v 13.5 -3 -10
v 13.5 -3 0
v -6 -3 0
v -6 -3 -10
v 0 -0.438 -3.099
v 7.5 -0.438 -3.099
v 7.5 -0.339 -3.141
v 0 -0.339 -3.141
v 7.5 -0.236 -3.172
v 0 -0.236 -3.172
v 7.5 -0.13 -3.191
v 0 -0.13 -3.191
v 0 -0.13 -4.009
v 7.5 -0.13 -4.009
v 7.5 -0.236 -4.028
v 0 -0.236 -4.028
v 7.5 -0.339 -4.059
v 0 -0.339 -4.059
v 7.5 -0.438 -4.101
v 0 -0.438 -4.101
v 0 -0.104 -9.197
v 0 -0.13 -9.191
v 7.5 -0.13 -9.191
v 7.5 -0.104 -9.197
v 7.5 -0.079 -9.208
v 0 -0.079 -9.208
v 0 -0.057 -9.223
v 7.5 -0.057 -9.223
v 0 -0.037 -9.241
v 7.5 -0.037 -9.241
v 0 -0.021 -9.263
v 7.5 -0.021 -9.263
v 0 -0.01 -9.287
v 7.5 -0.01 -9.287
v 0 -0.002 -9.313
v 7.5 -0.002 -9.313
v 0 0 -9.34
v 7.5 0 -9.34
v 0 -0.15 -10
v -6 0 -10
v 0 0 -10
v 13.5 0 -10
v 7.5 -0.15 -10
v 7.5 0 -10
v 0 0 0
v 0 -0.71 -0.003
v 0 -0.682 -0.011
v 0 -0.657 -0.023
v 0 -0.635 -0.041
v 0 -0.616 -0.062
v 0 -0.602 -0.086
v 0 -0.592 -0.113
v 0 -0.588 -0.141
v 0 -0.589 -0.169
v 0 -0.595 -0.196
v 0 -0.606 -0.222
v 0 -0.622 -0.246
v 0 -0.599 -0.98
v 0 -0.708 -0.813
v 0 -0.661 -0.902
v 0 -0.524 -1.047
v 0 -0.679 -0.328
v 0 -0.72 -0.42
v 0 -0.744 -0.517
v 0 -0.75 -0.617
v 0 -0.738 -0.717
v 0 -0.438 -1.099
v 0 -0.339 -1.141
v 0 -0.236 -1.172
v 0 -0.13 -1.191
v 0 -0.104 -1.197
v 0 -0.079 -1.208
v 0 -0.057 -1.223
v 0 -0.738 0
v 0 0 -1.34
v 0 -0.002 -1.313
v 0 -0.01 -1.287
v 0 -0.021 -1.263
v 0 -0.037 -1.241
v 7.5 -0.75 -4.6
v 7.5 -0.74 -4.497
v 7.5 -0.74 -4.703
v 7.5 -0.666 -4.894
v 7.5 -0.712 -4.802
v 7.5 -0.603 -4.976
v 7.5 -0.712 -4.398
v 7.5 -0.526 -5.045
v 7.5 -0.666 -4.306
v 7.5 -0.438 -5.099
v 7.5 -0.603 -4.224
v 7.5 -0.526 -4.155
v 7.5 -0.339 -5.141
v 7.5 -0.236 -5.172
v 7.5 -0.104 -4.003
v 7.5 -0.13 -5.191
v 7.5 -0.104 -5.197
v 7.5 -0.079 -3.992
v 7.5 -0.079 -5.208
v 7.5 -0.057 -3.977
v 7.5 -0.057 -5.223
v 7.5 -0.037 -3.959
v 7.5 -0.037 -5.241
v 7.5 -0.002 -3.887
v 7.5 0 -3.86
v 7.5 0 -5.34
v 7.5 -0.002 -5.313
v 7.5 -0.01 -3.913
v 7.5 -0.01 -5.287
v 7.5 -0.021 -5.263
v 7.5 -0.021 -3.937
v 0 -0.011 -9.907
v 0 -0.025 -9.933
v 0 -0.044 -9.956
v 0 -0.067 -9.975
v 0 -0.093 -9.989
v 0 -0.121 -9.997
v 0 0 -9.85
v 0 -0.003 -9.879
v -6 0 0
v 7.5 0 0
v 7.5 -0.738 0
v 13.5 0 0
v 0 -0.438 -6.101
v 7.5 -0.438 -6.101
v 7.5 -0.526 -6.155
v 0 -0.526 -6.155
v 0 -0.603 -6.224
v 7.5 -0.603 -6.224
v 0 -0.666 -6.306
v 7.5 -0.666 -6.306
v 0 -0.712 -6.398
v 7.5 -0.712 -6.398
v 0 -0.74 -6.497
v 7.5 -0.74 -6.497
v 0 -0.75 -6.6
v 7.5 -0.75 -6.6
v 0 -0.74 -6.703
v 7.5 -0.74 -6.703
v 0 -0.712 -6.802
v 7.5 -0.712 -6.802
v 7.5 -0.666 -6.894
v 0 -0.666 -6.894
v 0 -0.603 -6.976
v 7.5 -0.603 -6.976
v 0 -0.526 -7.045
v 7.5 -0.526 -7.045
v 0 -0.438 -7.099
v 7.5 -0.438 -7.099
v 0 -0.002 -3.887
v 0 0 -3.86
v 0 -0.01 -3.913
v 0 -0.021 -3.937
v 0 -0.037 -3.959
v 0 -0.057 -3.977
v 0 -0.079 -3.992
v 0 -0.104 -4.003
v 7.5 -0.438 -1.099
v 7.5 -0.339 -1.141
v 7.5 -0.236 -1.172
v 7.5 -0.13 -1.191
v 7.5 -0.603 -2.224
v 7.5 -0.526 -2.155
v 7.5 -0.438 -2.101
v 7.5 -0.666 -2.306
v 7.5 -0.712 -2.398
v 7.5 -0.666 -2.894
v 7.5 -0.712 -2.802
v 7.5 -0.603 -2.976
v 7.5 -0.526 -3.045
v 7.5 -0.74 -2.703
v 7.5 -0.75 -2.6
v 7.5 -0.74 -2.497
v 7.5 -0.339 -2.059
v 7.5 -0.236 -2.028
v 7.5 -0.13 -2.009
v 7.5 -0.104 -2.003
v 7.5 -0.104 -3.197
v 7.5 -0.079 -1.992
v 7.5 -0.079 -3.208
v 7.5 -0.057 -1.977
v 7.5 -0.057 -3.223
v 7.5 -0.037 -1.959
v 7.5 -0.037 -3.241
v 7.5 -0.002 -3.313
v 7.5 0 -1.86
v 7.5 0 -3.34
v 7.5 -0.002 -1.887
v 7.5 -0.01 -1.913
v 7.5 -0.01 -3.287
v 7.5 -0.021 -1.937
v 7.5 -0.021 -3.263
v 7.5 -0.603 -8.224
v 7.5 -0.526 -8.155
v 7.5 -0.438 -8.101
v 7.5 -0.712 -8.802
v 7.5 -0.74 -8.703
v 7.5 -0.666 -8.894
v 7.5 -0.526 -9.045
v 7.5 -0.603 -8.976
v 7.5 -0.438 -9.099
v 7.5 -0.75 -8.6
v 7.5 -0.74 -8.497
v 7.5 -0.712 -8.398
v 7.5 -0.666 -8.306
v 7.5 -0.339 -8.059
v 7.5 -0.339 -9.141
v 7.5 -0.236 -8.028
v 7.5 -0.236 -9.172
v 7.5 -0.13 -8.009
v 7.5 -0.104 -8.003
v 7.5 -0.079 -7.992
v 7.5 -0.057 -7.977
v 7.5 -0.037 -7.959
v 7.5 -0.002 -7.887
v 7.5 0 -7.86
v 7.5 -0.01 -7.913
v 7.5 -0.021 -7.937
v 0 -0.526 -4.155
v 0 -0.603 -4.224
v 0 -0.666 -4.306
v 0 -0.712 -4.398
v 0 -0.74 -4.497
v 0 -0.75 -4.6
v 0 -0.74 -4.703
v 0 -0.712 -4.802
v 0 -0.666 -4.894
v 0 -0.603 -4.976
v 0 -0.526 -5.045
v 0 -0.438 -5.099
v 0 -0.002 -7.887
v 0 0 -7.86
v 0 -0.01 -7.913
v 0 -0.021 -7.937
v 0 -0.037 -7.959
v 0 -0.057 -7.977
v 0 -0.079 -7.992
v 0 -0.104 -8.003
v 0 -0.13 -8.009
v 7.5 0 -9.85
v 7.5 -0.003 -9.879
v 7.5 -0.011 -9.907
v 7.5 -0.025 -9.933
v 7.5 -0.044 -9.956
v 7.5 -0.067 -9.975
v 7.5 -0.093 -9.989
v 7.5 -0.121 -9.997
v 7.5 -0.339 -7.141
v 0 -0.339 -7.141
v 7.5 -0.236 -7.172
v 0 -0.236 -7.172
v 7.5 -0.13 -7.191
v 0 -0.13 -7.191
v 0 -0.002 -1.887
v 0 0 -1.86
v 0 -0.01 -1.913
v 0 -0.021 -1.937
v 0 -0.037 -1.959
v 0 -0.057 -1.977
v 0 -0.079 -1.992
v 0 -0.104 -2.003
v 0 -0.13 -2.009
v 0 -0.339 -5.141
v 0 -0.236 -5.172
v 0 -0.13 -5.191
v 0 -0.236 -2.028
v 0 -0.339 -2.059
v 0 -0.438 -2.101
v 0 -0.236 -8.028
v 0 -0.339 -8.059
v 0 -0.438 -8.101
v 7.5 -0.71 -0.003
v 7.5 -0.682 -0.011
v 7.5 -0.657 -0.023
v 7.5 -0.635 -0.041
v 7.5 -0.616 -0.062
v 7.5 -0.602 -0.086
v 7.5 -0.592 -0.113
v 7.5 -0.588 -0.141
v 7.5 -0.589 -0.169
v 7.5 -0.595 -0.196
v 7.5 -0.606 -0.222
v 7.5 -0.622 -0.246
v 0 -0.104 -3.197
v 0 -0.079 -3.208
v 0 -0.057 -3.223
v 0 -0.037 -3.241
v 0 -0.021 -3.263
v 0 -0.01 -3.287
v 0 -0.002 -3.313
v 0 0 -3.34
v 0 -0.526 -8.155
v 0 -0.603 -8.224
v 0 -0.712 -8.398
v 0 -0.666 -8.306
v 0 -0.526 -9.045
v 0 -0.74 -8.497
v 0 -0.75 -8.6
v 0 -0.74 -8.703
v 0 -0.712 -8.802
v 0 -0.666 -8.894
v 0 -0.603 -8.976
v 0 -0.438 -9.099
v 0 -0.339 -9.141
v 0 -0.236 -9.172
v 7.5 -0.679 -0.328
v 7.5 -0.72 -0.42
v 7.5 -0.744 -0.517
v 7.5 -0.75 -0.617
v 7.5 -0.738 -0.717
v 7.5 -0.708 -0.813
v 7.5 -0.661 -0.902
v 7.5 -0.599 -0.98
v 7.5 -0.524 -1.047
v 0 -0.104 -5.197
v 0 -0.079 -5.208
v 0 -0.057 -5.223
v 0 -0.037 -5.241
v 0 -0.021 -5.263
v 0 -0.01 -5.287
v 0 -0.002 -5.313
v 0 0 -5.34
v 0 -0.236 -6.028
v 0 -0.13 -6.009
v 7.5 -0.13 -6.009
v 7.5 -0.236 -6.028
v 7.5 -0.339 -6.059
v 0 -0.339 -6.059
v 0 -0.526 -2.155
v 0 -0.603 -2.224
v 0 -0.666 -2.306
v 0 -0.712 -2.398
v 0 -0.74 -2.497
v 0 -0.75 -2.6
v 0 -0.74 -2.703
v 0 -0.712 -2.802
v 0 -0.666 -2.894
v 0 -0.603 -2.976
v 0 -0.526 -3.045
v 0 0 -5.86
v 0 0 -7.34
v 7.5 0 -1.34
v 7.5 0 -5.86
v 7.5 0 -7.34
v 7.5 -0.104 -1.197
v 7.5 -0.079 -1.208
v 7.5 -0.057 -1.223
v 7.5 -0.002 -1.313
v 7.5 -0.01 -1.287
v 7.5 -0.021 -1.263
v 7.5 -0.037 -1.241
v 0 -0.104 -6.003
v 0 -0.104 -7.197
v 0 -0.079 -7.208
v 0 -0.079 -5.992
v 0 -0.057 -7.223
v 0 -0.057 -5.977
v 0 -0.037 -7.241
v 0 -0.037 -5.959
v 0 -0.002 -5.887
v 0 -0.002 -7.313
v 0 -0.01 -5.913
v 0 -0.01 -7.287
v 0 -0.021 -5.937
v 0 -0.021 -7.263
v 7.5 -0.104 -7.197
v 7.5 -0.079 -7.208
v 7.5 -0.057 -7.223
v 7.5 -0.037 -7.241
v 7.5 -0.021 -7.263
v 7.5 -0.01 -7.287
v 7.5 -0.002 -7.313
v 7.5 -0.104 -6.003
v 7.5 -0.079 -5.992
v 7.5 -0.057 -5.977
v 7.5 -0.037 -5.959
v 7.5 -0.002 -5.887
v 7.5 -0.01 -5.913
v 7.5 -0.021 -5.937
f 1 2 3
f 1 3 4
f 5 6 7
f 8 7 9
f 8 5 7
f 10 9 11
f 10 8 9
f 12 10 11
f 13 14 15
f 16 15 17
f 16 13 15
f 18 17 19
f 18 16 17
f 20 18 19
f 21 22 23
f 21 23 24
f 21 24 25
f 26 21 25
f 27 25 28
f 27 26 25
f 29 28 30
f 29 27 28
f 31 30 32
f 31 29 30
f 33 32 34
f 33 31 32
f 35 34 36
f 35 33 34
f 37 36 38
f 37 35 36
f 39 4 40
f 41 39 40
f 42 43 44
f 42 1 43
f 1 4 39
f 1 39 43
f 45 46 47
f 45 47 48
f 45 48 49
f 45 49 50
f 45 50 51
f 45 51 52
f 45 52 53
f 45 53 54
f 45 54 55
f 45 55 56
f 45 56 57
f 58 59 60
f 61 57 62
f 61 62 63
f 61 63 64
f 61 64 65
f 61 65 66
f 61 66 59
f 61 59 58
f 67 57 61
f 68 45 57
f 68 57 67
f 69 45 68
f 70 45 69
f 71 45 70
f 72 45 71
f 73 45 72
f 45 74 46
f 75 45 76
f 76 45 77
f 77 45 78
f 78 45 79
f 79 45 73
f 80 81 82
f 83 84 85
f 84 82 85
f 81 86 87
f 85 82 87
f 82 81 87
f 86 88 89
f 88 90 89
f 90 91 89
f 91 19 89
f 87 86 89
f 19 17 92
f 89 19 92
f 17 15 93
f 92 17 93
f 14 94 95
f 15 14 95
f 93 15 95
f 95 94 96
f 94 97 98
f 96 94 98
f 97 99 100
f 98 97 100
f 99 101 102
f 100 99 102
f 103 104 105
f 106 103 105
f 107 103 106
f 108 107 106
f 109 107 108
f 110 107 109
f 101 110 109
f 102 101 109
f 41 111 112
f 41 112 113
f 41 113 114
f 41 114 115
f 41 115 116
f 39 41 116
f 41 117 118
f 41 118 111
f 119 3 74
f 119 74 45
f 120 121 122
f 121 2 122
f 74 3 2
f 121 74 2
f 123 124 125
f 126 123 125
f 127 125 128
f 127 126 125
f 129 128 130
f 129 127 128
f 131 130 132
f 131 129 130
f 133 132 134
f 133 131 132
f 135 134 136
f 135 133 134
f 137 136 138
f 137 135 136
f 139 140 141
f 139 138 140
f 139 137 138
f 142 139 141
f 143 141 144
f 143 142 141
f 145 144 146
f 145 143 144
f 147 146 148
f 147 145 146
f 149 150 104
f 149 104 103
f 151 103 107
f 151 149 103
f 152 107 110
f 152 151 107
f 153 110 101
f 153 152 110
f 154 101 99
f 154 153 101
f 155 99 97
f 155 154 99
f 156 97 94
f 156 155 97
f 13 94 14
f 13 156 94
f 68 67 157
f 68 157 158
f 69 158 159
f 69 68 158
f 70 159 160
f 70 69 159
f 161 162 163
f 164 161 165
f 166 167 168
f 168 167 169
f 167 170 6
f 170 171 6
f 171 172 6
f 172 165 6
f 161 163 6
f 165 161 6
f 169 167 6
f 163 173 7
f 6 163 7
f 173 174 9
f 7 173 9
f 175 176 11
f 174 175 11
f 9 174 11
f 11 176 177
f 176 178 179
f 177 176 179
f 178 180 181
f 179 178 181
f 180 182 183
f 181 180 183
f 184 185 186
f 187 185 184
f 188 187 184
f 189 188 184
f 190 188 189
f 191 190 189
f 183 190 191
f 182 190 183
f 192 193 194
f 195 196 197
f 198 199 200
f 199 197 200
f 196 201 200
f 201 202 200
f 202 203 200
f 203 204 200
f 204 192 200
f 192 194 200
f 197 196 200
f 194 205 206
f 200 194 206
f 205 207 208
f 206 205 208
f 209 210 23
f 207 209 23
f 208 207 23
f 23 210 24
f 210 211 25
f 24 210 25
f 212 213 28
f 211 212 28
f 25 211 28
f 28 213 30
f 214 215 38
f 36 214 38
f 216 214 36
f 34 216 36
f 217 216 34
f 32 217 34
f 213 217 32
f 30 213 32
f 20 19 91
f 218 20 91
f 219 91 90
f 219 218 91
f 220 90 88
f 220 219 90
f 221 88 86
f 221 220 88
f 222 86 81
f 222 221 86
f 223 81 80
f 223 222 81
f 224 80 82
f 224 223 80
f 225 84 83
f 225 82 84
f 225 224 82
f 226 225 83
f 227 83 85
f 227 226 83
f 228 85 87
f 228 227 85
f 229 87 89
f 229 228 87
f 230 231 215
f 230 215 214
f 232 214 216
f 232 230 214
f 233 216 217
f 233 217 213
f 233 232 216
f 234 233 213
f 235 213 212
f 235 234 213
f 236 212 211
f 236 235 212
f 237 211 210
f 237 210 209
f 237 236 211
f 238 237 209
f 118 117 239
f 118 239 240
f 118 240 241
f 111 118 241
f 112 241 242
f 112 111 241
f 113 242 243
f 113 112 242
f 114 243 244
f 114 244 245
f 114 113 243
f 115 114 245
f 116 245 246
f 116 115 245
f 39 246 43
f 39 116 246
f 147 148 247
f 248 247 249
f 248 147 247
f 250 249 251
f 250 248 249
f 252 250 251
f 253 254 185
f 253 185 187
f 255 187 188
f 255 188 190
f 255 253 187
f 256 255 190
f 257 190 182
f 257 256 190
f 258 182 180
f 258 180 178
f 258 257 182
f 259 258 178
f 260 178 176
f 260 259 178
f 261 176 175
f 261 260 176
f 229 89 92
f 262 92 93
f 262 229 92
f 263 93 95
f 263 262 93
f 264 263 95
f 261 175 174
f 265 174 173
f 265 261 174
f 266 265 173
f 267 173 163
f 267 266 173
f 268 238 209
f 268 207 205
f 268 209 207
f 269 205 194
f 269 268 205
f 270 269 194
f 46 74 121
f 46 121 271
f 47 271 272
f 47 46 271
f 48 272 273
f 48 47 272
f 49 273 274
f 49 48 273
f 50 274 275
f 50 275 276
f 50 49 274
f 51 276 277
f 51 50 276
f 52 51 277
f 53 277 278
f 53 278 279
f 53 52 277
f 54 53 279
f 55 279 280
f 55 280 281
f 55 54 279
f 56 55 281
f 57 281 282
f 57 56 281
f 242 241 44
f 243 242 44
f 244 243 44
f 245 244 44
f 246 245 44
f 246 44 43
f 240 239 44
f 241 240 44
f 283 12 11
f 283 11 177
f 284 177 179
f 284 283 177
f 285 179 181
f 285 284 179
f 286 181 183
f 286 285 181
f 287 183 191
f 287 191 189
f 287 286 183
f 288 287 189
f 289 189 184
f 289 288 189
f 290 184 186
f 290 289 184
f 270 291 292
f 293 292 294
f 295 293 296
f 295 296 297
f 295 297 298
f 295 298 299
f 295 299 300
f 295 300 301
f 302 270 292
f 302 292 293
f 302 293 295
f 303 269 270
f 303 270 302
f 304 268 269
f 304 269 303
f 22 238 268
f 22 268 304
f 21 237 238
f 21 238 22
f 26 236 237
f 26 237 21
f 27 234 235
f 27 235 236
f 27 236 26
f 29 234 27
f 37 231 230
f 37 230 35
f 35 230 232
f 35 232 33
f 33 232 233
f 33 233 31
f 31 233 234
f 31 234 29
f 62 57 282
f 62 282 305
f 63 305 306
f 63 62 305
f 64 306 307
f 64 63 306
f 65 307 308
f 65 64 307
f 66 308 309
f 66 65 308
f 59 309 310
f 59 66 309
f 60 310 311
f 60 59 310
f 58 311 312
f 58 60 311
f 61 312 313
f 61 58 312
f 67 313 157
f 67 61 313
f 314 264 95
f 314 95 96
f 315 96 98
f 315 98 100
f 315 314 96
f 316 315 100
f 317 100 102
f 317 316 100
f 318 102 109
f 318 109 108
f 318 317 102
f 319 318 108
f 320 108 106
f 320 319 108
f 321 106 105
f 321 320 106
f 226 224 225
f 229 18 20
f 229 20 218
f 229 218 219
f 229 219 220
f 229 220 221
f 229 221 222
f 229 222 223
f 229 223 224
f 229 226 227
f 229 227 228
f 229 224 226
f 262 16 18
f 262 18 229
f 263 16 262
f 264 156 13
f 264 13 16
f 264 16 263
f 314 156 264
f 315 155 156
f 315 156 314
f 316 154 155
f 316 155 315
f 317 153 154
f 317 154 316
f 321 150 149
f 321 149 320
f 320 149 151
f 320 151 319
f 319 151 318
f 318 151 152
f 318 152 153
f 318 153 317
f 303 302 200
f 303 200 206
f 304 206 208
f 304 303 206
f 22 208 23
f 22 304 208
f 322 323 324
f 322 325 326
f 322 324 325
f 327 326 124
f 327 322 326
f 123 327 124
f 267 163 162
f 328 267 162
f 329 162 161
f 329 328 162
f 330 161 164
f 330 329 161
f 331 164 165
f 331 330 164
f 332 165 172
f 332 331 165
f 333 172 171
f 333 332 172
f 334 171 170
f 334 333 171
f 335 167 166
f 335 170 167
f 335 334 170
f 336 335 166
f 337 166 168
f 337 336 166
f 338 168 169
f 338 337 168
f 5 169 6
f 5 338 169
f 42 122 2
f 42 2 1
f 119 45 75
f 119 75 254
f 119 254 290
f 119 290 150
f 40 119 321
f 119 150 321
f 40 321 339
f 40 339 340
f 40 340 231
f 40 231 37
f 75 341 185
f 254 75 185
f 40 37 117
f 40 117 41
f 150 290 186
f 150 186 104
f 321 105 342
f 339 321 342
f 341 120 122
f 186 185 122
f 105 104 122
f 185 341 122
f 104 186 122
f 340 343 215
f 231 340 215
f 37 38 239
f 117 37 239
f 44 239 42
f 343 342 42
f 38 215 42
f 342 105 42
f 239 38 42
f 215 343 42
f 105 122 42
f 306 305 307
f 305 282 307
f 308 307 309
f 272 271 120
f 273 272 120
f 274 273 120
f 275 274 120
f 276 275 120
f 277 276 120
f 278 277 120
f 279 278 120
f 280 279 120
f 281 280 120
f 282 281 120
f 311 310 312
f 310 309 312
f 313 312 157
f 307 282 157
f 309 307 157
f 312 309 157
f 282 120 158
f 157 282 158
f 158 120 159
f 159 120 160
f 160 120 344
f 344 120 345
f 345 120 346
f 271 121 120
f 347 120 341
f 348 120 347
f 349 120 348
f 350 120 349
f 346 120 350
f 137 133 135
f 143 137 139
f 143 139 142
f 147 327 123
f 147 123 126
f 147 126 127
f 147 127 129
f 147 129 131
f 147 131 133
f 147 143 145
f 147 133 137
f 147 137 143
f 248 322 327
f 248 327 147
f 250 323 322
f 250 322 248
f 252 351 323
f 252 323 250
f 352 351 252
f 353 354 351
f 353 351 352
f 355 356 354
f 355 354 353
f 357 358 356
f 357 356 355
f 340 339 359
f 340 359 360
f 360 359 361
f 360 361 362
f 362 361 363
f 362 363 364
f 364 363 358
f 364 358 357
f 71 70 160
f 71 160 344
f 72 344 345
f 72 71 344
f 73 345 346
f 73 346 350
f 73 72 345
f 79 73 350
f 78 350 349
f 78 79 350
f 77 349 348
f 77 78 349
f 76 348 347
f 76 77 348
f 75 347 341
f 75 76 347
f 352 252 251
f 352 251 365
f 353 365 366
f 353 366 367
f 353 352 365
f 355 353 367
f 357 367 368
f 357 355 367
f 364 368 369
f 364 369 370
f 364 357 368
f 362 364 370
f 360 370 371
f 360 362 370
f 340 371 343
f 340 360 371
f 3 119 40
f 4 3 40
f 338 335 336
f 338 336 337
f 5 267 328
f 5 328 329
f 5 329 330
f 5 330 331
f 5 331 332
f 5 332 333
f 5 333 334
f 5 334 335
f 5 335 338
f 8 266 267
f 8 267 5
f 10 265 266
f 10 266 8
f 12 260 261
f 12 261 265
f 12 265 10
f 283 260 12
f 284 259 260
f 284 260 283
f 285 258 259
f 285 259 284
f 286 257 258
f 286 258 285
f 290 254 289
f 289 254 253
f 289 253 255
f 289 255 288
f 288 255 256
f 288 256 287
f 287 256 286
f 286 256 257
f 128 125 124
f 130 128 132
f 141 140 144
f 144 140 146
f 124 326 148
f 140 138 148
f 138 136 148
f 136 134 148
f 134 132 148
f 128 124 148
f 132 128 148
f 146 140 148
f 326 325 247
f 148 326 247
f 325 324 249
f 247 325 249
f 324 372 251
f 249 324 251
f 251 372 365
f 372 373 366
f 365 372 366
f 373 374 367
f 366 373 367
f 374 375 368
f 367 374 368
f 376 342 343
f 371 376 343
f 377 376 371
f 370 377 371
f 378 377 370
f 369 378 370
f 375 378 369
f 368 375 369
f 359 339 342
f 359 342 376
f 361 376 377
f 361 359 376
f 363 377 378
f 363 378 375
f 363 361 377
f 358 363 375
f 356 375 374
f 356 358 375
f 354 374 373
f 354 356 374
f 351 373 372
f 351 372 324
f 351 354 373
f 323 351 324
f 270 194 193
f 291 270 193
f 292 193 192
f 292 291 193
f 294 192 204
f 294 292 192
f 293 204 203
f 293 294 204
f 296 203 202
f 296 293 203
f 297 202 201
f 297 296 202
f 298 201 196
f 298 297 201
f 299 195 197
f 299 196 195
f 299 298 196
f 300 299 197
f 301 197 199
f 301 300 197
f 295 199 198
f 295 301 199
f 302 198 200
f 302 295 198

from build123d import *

# Parameters (mm, degrees)
SKETCH2_W           = 10
SKETCH2_H           = 3
BOSS_EXTRUDE1_DEPTH = 7.5
CUT_EXTRUDE2_DEPTH  = 13.854960132
LPATTERN2_COUNT     = 10
LPATTERN2_PITCH     = 2
FILLET2_START       = -1
FILLET2_DEPTH       = 9
SKETCH3_W           = 10
SKETCH3_H           = 3
BOSS_EXTRUDE2_DEPTH = 6


with BuildPart() as part:
    # Sketch2 → Boss-Extrude1 (new body)
    with BuildSketch(Plane(origin=(0, 0, 0), x_dir=(0, 0, -1), z_dir=(1, 0, 0))):
        with Locations((5, -1.5)):
            Rectangle(SKETCH2_W, SKETCH2_H)
    extrude(amount=BOSS_EXTRUDE1_DEPTH)

    # Sketch1 → Cut-Extrude2 (cut, through all)
    with BuildSketch(Plane(origin=(0, 0, 0), x_dir=(0, 0, -1), z_dir=(1, 0, 0))):
        with BuildLine():
            ThreePointArc((0.10112359, -0.438202237), (0.045620517, -0.221237163), (0.080384758, 0))
            Line((0.080384758, 0), (0, 0))
            ThreePointArc((0, 0), (0.025608803, -0.224859501), (0.10112359, -0.438202237))
        make_face()
        with BuildLine():
            ThreePointArc((1.155, -0.195), (1.146082164, -0.095907769), (1.119615242, 0))
            Line((1.119615242, 0), (0.080384758, 0))
            ThreePointArc((0.080384758, 0), (0.045620517, -0.221237163), (0.10112359, -0.438202237))
            ThreePointArc((0.10112359, -0.438202237), (0.6, -0.75), (1.09887641, -0.438202237))
            ThreePointArc((1.09887641, -0.438202237), (1.140787115, -0.319797021), (1.155, -0.195))
        make_face()
        with BuildLine():
            Line((0.080384758, 0), (1.119615242, 0))
            ThreePointArc((1.119615242, 0), (0.6, 0.36), (0.080384758, 0))
        make_face()
        with BuildLine():
            ThreePointArc((1.09887641, -0.438202237), (1.174391197, -0.224859501), (1.2, 0))
            Line((1.2, 0), (1.119615242, 0))
            ThreePointArc((1.119615242, 0), (1.146082164, -0.095907769), (1.155, -0.195))
            ThreePointArc((1.155, -0.195), (1.140787115, -0.319797021), (1.09887641, -0.438202237))
        make_face()
    cut_extrude2 = extrude(amount=CUT_EXTRUDE2_DEPTH, mode=Mode.SUBTRACT)

    # LPattern2: Cut-Extrude2 ×10
    with Locations(*[(0, 0, -i * LPATTERN2_PITCH) for i in range(1, LPATTERN2_COUNT)]):
        add(cut_extrude2, mode=Mode.SUBTRACT)

    # Fillet2: read off the stored shape, not the designer's step
    # Fillet2 outline → Fillet2 (cut)
    with BuildSketch(Plane.YZ.offset(FILLET2_START)):
        with BuildLine():
            Line((0, -10), (0, -9.85))
            ThreePointArc((0, -9.85), (-0.043933983, -9.956066017), (-0.15, -10))
            Line((-0.15, -10), (0, -10))
        make_face()
        with BuildLine():
            ThreePointArc((-0.130434783, -9.191456891), (-0.037228588, -9.241268354), (0, -9.340175425))
            Line((0, -9.340175425), (0, -9.2))
            ThreePointArc((0, -9.2), (-0.065357129, -9.197861937), (-0.130434783, -9.191456891))
        make_face()
        with BuildLine():
            Line((0, -8), (0, -7.859824575))
            ThreePointArc((0, -7.859824575), (-0.037228588, -7.958731646), (-0.130434783, -8.008543109))
            ThreePointArc((-0.130434783, -8.008543109), (-0.065357129, -8.002138063), (0, -8))
        make_face()
        with BuildLine():
            ThreePointArc((-0.130434783, -7.191456891), (-0.037228588, -7.241268354), (0, -7.340175425))
            Line((0, -7.340175425), (0, -7.2))
            ThreePointArc((0, -7.2), (-0.065357129, -7.197861937), (-0.130434783, -7.191456891))
        make_face()
        with BuildLine():
            Line((0, -6), (0, -5.859824575))
            ThreePointArc((0, -5.859824575), (-0.037228588, -5.958731646), (-0.130434783, -6.008543109))
            ThreePointArc((-0.130434783, -6.008543109), (-0.065357129, -6.002138063), (0, -6))
        make_face()
        with BuildLine():
            ThreePointArc((-0.130434783, -5.191456891), (-0.037228588, -5.241268354), (0, -5.340175425))
            Line((0, -5.340175425), (0, -5.2))
            ThreePointArc((0, -5.2), (-0.065357129, -5.197861937), (-0.130434783, -5.191456891))
        make_face()
        with BuildLine():
            Line((0, -4), (0, -3.859824575))
            ThreePointArc((0, -3.859824575), (-0.037228588, -3.958731646), (-0.130434783, -4.008543109))
            ThreePointArc((-0.130434783, -4.008543109), (-0.065357129, -4.002138063), (0, -4))
        make_face()
        with BuildLine():
            ThreePointArc((-0.130434783, -3.191456891), (-0.037228588, -3.241268354), (0, -3.340175425))
            Line((0, -3.340175425), (0, -3.2))
            ThreePointArc((0, -3.2), (-0.065357129, -3.197861937), (-0.130434783, -3.191456891))
        make_face()
        with BuildLine():
            Line((0, -2), (0, -1.859824575))
            ThreePointArc((0, -1.859824575), (-0.037228588, -1.958731646), (-0.130434783, -2.008543109))
            ThreePointArc((-0.130434783, -2.008543109), (-0.065357129, -2.002138063), (0, -2))
        make_face()
        with BuildLine():
            ThreePointArc((-0.737701575, 0), (-0.601941305, -0.086210119), (-0.622233155, -0.245744681))
            ThreePointArc((-0.622233155, -0.245744681), (-0.537928158, -0.163622551), (-0.438202247, -0.101123596))
            ThreePointArc((-0.438202247, -0.101123596), (-0.224859507, -0.025608804), (0, 0))
            Line((0, 0), (-0.737701575, 0))
        make_face()
        with BuildLine():
            ThreePointArc((-0.130434783, -1.191456891), (-0.037228588, -1.241268354), (0, -1.340175425))
            Line((0, -1.340175425), (0, -1.2))
            ThreePointArc((0, -1.2), (-0.065357129, -1.197861937), (-0.130434783, -1.191456891))
        make_face()
    extrude(amount=FILLET2_DEPTH, mode=Mode.SUBTRACT)

    # Sketch3 → Boss-Extrude2 (add)
    with BuildSketch(Plane(origin=(7.5, 0, 0), x_dir=(0, 0, -1), z_dir=(1, 0, 0))):
        with Locations((5, -1.5)):
            Rectangle(SKETCH3_W, SKETCH3_H)
    boss_extrude2 = extrude(amount=BOSS_EXTRUDE2_DEPTH)

    # Mirror1: Boss-Extrude2 across plane
    add(boss_extrude2.mirror(Plane.ZY.offset(-3.75)))


solid = part.part
